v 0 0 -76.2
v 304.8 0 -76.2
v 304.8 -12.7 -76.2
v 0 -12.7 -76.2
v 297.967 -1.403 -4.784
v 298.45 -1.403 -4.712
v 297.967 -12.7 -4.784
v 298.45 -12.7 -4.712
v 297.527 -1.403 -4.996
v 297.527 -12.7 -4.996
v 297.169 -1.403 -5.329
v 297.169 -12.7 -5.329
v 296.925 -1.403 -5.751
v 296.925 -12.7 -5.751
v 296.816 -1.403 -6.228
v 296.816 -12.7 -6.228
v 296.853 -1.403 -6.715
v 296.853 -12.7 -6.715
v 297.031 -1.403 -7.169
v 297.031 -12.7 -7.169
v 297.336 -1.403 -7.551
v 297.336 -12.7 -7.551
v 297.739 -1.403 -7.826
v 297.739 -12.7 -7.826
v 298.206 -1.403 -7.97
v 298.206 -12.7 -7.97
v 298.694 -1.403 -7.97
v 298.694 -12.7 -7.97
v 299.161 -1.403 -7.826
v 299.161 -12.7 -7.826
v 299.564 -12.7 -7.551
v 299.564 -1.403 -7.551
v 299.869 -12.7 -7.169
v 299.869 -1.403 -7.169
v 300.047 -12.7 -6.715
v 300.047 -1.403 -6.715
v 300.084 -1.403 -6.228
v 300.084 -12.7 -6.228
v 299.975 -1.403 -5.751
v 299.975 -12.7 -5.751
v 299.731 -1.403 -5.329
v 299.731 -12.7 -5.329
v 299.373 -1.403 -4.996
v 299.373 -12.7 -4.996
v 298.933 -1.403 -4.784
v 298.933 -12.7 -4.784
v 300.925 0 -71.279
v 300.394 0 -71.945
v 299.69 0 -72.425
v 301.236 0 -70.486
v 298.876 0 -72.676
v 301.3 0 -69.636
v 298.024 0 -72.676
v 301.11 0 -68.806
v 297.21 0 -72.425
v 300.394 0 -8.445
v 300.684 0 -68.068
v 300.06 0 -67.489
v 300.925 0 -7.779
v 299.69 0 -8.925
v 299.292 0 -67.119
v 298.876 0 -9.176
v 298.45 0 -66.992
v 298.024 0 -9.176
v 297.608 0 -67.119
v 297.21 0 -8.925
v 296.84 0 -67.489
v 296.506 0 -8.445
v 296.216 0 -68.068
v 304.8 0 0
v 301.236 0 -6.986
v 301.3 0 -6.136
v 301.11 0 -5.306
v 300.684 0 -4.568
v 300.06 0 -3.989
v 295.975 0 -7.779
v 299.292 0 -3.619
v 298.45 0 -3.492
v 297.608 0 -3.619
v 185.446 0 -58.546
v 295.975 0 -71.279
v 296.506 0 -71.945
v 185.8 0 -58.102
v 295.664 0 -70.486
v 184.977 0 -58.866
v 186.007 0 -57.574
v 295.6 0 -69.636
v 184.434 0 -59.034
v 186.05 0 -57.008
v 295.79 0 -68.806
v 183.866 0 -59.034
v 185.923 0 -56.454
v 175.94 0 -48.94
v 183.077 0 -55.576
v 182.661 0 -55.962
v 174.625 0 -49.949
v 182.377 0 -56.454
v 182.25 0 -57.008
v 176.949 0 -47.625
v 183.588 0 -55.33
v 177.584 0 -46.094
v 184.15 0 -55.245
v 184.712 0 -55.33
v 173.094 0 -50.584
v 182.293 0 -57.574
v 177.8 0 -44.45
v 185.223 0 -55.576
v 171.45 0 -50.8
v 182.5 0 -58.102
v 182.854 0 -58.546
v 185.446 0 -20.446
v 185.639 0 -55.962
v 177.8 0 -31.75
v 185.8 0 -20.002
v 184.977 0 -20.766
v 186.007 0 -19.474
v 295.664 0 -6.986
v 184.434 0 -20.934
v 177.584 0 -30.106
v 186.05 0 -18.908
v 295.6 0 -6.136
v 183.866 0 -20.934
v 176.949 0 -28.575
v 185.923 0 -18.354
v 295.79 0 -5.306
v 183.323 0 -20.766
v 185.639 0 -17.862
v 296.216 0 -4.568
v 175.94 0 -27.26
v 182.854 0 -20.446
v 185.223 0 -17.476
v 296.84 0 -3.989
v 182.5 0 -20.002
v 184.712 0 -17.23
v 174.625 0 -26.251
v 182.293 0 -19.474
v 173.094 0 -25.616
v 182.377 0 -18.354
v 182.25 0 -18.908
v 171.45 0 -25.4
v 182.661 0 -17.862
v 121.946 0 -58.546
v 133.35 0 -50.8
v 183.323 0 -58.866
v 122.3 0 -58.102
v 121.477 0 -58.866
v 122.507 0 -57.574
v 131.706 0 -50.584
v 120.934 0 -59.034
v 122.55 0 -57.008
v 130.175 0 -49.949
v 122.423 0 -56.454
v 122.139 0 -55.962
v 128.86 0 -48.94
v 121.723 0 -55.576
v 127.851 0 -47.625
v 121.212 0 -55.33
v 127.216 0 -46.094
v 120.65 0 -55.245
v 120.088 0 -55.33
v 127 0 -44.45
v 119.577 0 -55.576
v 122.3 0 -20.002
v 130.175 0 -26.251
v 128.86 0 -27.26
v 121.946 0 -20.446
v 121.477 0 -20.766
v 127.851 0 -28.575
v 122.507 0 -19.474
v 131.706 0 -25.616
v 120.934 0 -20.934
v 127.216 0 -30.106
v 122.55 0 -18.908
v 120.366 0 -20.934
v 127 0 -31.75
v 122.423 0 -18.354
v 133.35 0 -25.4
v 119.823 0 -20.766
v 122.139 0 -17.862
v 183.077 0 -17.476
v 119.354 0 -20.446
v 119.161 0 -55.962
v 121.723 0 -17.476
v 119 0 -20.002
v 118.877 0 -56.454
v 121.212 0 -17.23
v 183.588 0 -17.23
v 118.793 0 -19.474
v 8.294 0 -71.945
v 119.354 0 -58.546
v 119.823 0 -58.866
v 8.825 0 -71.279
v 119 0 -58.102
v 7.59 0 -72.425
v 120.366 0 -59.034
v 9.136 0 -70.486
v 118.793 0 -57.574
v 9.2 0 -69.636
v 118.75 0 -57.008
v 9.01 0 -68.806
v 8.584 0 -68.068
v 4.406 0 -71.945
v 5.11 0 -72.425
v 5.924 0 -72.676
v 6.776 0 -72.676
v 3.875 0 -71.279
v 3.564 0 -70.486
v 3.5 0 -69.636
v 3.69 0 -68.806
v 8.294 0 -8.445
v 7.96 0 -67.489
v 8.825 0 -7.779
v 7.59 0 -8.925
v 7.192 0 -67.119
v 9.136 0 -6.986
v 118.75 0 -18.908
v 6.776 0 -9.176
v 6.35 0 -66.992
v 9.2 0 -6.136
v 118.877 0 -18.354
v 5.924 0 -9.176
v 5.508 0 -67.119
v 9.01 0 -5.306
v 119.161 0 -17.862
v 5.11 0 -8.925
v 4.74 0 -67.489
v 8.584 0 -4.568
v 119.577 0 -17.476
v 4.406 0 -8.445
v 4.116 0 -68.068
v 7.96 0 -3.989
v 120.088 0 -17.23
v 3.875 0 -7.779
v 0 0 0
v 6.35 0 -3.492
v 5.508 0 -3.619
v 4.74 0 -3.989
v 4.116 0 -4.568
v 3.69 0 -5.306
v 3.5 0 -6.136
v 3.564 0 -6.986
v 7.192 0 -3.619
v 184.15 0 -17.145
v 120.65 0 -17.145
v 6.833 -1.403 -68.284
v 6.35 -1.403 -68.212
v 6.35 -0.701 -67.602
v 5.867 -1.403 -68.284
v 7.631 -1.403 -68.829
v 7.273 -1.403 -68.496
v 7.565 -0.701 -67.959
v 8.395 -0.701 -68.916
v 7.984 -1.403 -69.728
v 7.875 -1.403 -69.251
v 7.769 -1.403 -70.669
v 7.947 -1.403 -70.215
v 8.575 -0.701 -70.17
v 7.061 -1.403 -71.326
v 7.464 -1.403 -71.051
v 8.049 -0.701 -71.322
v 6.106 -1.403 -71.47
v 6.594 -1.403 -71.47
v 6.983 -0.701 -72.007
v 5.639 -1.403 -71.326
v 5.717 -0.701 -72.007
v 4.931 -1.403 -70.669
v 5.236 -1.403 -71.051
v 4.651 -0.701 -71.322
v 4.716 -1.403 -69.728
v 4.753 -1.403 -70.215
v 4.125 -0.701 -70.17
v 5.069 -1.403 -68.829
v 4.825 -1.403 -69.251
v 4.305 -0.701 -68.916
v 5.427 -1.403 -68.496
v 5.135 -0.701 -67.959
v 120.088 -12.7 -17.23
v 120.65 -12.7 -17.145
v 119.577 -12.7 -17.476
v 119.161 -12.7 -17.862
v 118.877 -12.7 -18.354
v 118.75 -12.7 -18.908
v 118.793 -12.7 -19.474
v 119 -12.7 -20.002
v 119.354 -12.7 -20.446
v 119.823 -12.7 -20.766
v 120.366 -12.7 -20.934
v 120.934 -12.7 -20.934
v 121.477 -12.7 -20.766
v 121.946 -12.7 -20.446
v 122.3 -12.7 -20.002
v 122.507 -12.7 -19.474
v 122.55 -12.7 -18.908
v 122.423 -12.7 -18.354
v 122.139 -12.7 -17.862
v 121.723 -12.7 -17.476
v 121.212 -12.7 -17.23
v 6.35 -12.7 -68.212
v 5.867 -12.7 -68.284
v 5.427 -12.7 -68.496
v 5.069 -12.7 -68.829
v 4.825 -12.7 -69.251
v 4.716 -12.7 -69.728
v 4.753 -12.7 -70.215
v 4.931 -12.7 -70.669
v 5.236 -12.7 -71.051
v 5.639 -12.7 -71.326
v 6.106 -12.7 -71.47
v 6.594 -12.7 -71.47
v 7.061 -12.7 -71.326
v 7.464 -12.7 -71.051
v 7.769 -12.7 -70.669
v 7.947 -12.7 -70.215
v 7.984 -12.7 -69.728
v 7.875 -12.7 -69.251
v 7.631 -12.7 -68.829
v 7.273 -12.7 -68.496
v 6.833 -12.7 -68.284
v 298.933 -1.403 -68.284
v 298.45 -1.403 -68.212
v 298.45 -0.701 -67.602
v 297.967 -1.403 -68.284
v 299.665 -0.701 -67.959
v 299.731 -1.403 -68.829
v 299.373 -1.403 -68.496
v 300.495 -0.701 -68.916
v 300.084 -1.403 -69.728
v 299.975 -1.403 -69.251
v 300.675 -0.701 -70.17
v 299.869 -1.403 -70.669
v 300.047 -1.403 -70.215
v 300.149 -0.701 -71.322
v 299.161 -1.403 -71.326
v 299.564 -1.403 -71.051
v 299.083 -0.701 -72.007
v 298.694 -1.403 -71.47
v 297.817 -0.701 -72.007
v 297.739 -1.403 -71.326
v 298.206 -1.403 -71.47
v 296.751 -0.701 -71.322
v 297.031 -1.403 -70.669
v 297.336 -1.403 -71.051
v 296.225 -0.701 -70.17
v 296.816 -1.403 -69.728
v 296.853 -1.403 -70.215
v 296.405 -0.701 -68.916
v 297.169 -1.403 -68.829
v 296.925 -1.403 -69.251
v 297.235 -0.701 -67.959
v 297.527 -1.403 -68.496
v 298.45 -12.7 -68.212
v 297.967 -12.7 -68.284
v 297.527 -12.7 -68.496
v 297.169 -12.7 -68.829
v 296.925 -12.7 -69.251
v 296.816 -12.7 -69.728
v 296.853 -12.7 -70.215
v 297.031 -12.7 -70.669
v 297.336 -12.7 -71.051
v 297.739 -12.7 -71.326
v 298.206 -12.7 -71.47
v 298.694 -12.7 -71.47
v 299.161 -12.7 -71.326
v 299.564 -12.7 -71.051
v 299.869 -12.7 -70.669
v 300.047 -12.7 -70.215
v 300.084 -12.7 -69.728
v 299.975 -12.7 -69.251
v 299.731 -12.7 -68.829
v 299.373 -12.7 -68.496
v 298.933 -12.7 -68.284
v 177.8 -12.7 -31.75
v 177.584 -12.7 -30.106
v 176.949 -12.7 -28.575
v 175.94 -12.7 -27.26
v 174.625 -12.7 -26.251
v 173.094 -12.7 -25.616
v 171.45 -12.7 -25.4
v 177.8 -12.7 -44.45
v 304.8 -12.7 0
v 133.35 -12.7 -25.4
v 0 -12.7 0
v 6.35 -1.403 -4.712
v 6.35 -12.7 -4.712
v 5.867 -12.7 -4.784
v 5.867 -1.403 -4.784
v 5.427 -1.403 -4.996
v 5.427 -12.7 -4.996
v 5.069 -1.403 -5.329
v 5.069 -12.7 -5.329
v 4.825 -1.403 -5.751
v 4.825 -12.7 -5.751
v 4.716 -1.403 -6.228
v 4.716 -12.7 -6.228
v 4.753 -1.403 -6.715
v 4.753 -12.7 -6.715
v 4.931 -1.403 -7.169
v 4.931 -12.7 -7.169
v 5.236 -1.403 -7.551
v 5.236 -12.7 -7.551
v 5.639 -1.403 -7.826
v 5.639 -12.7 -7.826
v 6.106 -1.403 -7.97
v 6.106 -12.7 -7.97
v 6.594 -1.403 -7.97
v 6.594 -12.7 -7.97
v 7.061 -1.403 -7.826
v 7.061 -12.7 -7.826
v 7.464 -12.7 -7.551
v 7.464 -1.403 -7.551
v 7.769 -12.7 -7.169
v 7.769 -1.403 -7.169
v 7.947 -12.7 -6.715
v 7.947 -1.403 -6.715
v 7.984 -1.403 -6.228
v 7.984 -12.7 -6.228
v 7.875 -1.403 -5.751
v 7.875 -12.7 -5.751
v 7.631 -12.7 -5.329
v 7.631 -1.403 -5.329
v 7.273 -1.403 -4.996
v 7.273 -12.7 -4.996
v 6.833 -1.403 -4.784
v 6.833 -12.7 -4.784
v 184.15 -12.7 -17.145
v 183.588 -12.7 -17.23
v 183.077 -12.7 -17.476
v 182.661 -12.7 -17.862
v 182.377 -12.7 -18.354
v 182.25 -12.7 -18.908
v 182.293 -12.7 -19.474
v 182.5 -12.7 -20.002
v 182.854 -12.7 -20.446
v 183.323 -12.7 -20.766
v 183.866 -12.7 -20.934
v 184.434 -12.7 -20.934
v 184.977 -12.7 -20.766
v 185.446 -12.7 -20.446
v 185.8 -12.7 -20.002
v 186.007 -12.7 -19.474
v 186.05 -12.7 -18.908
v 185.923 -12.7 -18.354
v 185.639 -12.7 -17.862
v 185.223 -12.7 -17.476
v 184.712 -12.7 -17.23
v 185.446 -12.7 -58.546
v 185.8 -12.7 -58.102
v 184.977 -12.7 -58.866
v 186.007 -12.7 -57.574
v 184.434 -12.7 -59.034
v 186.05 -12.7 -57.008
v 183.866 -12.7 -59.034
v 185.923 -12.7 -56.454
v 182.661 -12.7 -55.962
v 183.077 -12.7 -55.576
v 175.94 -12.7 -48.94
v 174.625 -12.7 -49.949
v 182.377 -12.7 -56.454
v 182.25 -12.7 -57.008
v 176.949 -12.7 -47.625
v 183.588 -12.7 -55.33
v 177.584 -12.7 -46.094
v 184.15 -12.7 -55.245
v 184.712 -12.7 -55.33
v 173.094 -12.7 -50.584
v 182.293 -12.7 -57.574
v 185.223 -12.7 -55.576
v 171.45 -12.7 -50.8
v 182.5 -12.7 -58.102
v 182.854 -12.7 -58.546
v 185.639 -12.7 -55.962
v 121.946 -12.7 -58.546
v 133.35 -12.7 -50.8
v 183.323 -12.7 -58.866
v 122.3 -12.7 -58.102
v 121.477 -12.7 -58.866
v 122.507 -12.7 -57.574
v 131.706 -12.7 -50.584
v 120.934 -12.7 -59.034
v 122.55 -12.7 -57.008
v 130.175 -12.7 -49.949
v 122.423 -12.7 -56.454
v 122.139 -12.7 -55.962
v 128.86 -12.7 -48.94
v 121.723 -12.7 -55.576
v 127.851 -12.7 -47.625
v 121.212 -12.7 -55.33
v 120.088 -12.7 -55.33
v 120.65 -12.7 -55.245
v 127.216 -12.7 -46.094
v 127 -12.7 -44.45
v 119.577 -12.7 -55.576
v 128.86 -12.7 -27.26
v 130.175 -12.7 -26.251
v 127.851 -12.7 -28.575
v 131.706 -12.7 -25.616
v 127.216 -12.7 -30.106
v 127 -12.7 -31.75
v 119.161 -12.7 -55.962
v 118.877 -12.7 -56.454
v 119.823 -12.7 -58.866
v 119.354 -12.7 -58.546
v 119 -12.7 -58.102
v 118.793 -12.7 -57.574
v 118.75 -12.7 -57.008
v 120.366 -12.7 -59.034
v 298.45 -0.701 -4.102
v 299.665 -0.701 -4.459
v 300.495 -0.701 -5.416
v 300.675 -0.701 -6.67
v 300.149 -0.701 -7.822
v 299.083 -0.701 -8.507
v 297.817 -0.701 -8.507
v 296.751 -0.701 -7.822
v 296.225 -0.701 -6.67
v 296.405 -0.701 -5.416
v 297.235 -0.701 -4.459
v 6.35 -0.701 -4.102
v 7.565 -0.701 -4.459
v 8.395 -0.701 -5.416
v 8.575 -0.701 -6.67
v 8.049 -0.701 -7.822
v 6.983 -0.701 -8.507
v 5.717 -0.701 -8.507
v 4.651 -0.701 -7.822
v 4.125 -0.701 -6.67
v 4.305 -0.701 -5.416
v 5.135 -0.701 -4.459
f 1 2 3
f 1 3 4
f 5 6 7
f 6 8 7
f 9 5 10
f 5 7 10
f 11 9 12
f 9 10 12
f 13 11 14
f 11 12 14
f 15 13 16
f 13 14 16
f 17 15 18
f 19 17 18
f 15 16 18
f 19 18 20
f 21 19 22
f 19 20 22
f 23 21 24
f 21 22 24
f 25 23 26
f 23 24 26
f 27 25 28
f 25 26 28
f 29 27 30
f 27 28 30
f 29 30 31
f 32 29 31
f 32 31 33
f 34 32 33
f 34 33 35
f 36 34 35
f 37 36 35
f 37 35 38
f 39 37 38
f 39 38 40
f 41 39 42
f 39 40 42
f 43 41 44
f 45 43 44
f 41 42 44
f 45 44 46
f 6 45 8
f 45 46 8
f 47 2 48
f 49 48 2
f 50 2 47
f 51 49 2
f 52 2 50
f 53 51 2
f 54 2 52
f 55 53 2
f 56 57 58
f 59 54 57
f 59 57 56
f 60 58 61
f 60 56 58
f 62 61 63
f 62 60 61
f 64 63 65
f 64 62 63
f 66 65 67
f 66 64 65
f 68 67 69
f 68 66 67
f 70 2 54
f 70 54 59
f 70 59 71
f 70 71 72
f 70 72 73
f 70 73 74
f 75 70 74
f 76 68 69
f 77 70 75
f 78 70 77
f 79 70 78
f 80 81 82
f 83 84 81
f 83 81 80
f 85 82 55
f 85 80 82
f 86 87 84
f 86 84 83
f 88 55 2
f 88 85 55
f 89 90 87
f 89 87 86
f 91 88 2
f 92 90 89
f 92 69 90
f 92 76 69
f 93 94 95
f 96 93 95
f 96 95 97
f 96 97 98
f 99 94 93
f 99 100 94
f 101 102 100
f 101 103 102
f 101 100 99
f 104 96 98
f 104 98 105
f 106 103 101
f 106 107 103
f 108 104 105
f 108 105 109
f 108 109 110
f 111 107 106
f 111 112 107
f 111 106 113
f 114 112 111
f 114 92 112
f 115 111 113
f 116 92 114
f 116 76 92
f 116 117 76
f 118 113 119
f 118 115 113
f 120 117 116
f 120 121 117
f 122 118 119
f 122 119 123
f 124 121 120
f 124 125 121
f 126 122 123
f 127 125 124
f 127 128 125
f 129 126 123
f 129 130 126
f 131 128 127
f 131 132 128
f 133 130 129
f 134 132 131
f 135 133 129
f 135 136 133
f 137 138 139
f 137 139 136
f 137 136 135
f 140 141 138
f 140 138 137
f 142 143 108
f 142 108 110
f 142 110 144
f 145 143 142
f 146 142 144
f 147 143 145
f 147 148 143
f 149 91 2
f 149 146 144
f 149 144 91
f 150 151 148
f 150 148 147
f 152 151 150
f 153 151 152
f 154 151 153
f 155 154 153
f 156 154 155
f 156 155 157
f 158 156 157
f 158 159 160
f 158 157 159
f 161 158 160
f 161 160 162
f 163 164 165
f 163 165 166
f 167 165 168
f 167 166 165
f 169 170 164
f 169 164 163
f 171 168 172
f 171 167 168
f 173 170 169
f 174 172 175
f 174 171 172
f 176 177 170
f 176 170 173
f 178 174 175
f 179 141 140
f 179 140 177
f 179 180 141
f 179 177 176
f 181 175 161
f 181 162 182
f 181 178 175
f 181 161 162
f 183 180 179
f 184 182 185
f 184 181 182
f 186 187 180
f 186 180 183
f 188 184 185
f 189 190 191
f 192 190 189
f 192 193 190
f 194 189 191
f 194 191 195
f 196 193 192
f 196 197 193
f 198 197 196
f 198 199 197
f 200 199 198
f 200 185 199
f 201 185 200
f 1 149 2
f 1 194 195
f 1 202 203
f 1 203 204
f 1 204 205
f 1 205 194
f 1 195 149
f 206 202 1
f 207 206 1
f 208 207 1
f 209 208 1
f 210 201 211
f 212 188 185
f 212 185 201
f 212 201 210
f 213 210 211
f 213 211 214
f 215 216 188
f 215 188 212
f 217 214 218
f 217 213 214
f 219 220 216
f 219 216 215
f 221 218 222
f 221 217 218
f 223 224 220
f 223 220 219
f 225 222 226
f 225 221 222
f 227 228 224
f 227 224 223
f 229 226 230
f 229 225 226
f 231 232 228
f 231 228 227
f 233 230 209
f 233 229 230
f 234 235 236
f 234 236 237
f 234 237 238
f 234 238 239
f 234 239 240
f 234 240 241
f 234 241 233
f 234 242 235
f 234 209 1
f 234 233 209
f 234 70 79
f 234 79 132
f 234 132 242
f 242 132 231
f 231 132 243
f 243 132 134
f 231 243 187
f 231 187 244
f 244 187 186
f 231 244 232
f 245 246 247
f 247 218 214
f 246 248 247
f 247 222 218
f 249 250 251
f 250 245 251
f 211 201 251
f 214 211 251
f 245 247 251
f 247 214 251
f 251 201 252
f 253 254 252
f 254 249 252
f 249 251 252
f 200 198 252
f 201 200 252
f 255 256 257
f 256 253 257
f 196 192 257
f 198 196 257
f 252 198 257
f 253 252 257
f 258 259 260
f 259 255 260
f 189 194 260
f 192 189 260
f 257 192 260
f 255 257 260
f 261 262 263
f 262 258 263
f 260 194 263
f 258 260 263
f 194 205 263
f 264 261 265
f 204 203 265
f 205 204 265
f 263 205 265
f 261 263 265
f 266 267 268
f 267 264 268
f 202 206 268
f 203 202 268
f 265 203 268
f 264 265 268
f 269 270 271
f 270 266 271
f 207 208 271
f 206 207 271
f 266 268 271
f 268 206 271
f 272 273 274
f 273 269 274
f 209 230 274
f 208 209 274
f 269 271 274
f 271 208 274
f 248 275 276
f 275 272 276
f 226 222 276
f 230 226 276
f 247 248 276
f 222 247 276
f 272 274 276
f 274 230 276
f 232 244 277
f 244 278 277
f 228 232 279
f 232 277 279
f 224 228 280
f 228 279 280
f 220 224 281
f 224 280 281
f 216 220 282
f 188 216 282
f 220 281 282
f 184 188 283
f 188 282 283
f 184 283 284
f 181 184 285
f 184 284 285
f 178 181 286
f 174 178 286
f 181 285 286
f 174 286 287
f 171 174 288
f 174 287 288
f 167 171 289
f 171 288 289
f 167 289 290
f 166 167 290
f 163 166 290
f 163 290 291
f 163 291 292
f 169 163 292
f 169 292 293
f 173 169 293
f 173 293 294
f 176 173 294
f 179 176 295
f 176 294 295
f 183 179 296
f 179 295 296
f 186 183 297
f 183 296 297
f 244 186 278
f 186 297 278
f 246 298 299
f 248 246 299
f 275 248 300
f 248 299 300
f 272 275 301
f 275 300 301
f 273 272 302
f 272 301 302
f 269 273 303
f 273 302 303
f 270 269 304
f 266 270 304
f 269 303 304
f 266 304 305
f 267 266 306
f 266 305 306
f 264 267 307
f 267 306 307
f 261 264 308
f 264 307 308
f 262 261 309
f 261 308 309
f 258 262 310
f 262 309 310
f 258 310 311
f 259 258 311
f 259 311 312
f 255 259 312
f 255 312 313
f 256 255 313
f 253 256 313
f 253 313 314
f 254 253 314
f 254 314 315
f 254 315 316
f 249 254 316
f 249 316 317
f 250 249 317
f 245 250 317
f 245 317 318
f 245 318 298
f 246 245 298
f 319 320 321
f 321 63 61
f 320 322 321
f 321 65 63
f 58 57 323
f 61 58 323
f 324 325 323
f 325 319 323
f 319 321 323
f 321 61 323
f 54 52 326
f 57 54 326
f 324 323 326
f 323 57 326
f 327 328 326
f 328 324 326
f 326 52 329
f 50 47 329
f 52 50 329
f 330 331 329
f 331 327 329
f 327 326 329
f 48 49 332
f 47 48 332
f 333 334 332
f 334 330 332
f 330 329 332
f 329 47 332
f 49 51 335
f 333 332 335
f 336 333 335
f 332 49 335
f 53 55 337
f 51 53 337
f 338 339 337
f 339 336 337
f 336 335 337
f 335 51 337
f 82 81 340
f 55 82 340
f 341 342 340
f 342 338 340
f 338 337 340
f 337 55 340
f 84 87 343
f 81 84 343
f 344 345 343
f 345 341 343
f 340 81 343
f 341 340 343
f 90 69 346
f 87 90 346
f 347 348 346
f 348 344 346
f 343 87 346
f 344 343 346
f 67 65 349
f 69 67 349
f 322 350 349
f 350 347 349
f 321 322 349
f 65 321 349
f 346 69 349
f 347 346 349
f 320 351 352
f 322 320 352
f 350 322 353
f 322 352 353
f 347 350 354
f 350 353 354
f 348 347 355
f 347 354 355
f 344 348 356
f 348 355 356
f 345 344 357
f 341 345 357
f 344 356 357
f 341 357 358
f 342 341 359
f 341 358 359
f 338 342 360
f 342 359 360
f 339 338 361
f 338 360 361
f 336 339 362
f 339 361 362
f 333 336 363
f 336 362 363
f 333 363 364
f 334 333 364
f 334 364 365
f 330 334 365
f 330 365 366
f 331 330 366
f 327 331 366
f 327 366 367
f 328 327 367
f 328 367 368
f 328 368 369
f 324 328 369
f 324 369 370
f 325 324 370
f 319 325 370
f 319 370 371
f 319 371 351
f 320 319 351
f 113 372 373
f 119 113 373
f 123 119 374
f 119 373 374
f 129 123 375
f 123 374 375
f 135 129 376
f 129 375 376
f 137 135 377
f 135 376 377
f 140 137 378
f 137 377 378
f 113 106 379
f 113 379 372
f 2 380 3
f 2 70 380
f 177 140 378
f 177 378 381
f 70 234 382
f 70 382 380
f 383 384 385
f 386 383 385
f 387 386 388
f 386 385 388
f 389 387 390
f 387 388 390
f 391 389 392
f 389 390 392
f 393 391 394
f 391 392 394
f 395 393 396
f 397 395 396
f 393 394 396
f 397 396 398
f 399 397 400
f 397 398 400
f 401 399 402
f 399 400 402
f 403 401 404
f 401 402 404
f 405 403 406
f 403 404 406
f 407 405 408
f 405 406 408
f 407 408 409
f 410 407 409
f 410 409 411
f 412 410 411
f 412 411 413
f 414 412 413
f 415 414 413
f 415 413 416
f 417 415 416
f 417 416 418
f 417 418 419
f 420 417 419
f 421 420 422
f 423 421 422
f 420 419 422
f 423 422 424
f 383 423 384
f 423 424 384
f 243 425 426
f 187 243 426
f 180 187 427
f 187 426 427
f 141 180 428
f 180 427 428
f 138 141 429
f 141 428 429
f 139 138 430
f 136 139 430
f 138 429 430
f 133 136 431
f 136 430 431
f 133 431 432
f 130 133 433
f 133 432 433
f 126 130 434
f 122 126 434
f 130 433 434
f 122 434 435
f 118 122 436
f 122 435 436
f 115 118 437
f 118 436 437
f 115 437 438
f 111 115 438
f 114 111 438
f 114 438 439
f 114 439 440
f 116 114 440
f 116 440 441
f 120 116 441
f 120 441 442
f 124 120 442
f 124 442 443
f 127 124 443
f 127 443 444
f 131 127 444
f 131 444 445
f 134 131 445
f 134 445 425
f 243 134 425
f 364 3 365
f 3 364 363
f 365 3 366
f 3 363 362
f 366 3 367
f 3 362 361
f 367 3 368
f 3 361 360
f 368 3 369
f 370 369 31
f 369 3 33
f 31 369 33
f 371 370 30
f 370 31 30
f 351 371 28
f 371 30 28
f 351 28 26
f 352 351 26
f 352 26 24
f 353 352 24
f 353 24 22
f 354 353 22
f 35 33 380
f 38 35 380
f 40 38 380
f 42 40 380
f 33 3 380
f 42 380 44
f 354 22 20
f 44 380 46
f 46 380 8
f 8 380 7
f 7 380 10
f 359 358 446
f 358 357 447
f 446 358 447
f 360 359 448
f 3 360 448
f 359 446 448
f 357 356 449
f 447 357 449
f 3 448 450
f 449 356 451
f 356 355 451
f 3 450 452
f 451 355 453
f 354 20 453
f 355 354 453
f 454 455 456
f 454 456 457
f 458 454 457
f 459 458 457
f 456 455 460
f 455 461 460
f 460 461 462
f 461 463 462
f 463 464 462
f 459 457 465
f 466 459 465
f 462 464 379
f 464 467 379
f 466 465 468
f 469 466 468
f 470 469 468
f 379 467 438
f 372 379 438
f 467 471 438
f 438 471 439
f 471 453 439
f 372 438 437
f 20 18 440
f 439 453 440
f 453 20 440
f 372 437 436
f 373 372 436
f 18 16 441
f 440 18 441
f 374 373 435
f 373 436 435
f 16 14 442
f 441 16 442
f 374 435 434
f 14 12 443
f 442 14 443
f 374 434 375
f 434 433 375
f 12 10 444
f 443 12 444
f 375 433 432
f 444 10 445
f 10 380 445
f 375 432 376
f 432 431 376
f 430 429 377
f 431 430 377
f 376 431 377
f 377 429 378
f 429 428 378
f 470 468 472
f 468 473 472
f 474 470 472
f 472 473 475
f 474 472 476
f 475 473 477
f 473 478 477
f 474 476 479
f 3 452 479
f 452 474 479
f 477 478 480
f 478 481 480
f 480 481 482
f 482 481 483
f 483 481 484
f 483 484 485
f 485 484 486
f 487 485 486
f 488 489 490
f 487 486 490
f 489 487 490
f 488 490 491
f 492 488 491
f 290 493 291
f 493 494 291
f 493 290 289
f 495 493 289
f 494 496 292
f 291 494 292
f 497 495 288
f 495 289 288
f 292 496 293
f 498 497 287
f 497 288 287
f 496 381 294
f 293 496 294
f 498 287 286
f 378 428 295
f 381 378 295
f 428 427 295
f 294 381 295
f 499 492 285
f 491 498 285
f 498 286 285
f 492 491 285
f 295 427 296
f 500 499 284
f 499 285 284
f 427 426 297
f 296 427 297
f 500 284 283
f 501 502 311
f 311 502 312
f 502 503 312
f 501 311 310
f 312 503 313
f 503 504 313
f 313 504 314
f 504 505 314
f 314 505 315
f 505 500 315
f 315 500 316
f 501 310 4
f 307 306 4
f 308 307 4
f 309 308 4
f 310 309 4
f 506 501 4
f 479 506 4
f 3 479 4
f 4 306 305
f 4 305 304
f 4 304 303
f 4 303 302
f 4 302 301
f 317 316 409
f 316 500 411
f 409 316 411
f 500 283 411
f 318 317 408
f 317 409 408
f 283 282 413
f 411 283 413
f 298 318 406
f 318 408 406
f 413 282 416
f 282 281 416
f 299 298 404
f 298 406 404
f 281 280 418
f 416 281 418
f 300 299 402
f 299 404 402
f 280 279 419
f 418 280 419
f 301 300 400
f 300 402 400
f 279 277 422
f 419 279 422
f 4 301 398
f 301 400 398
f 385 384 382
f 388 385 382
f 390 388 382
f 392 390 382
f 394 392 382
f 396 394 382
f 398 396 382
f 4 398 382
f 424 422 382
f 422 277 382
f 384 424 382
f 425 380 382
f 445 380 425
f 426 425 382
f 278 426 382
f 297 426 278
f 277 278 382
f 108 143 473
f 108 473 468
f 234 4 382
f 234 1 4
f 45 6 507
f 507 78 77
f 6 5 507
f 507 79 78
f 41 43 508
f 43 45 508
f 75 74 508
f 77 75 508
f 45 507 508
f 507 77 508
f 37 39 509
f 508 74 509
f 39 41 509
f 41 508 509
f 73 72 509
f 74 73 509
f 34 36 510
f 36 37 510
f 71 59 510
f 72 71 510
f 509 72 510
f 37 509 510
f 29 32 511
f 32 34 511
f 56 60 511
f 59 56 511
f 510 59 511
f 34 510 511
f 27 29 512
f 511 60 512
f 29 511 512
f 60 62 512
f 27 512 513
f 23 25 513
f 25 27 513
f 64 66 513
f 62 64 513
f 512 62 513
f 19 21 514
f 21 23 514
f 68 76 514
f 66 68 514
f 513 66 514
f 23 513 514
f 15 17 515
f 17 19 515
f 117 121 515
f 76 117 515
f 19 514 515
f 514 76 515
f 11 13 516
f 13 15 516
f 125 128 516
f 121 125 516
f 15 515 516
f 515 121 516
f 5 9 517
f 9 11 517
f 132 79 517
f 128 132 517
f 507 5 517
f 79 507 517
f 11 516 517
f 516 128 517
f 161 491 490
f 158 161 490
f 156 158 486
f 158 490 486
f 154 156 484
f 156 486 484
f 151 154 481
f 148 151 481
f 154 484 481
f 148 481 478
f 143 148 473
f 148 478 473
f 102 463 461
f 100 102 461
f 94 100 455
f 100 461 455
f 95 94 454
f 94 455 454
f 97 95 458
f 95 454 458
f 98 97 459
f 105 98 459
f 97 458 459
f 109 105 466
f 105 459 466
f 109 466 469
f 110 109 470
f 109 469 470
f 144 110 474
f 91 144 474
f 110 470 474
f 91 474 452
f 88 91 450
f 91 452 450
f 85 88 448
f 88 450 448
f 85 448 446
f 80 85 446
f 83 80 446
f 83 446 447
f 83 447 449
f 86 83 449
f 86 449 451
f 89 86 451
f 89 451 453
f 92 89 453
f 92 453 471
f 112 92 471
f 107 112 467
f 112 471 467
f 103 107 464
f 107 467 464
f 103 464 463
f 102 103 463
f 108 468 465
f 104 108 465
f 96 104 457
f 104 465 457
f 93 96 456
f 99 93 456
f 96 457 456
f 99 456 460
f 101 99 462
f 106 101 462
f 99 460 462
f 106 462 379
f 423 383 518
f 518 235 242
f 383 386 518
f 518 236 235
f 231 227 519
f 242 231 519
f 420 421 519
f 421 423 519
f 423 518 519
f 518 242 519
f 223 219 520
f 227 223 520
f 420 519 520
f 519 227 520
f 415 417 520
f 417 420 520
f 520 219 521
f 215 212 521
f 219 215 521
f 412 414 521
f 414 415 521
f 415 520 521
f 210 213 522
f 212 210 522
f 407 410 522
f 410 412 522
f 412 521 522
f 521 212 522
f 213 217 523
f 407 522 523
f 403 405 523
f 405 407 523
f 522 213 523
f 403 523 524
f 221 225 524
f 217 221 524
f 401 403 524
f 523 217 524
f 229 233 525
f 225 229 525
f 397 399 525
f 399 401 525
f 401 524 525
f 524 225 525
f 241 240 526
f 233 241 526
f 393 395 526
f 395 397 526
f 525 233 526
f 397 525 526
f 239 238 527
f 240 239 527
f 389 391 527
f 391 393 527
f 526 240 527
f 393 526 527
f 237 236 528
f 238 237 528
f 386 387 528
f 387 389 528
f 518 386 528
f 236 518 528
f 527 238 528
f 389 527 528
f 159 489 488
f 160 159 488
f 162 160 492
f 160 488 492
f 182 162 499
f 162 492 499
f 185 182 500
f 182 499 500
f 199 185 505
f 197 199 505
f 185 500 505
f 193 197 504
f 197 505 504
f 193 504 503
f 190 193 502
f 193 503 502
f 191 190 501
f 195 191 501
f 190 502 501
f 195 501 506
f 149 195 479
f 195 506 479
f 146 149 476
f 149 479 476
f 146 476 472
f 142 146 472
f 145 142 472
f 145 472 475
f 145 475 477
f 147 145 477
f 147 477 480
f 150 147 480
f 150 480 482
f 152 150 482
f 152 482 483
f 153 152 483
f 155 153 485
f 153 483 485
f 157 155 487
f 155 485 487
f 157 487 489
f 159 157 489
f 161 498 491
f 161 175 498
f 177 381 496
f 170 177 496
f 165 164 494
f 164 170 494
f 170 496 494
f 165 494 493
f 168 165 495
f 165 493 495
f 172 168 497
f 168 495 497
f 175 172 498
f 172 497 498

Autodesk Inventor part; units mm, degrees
ref_plane "YZ Plane" through (0, 0, 0) normal (1, 0, 0) x (0, 1, 0)
ref_plane "XZ Plane" through (0, 0, 0) normal (0, 1, 0) x (-1, 0, 0)
ref_plane "XY Plane" through (0, 0, 0) normal (0, 0, 1) x (1, 0, 0)
sketch "Sketch1" plane through (0, 0, 0) normal (0, 1, 0) x (-1, 0, 0)
  line L0 (0, 0) -> (-304.8, 0)
  line L1 (-304.8, 0) -> (-304.8, -76.2)
  line L2 (-304.8, -76.2) -> (0, -76.2)
  line L3 (0, -76.2) -> (0, 0)
  circle A0 centre (-6.35, -69.85) radius 1.3891
  circle A1 centre (-6.35, -6.35) radius 1.3891
  circle A2 centre (-298.45, -6.35) radius 1.3891
  circle A3 centre (-298.45, -69.85) radius 1.3891
  line L4 (-152.4, -76.2) -> (-152.4, 0)
  line L5 (-304.8, -38.1) -> (0, -38.1)
  line L6 (-127, -50.8) -> (-177.8, -50.8)
  line L7 (-177.8, -50.8) -> (-177.8, -25.4)
  line L8 (-177.8, -25.4) -> (-127, -25.4)
  line L9 (-127, -25.4) -> (-127, -50.8)
  line L10 (-127, -50.8) -> (-177.8, -25.4) construction
  line L11 (-177.8, -50.8) -> (-127, -25.4) construction
  line L12 (-120.65, -57.15) -> (-184.15, -57.15) construction
  line L13 (-184.15, -57.15) -> (-184.15, -19.05) construction
  line L14 (-184.15, -19.05) -> (-120.65, -19.05) construction
  line L15 (-120.65, -19.05) -> (-120.65, -57.15) construction
  circle A4 centre (-120.65, -57.15) radius 1.5875
  circle A5 centre (-184.15, -57.15) radius 1.5875
  circle A6 centre (-120.65, -19.05) radius 1.5875
  circle A7 centre (-184.15, -19.05) radius 1.5875
  point P0 (-152.4, -38.1)
  dimension "d0" = 76.2
  dimension "d1" = 304.8
  dimension "d4" = 2.7781
  dimension "d5" = 6.35
  dimension "d6" = 6.35
  dimension "d7" = 6.35
  dimension "d8" = 6.35
  dimension "d16" = 50.8
  dimension "d17" = 25.4
  dimension "d19" = 6.35
  dimension "d20" = 3.175
extrude "Extrusion1" add sketch "Sketch1" against normal blind 12.7 contours L3 L5 L9 L8 L4 L0 | L4 L8 L7 L5 L1 L0 | L3 L2 L4 L6 L9 L5 | L5 L7 L6 L4 L2 L1 | A0 | A1 | A2 | A3 | A4 | A5 | A6 | A7
hole "Hole1" at (6.35, 0, -69.85) at (298.45, 0, -69.85) at (298.45, 0, -6.35) at (6.35, 0, -6.35) direction (0, -1, 0) diameter 3.2766 end through all countersink diameter 5.715 countersink angle 82 clearance for "Flat Head Machine Screw (82)" size "#4" standard "Ansi Unified Screw Threads"
hole "Hole2" at (120.65, 0, -57.15) at (184.15, 0, -57.15) at (184.15, 0, -19.05) at (120.65, 0, -19.05) direction (0, -1, 0) diameter 3.81 end through all clearance for "Flat Head Machine Screw (82)" size "#6" standard "Ansi Unified Screw Threads"
fillet "Fillet1" radius 6.35 4 edges at (127, -6.35, -50.8) (127, -6.35, -25.4) (177.8, -6.35, -25.4) (177.8, -6.35, -50.8)
equation "\"d7\" = d5"
equation "\"d8\" = d6"
properties material "MDF Medium Density Fiberboard"
